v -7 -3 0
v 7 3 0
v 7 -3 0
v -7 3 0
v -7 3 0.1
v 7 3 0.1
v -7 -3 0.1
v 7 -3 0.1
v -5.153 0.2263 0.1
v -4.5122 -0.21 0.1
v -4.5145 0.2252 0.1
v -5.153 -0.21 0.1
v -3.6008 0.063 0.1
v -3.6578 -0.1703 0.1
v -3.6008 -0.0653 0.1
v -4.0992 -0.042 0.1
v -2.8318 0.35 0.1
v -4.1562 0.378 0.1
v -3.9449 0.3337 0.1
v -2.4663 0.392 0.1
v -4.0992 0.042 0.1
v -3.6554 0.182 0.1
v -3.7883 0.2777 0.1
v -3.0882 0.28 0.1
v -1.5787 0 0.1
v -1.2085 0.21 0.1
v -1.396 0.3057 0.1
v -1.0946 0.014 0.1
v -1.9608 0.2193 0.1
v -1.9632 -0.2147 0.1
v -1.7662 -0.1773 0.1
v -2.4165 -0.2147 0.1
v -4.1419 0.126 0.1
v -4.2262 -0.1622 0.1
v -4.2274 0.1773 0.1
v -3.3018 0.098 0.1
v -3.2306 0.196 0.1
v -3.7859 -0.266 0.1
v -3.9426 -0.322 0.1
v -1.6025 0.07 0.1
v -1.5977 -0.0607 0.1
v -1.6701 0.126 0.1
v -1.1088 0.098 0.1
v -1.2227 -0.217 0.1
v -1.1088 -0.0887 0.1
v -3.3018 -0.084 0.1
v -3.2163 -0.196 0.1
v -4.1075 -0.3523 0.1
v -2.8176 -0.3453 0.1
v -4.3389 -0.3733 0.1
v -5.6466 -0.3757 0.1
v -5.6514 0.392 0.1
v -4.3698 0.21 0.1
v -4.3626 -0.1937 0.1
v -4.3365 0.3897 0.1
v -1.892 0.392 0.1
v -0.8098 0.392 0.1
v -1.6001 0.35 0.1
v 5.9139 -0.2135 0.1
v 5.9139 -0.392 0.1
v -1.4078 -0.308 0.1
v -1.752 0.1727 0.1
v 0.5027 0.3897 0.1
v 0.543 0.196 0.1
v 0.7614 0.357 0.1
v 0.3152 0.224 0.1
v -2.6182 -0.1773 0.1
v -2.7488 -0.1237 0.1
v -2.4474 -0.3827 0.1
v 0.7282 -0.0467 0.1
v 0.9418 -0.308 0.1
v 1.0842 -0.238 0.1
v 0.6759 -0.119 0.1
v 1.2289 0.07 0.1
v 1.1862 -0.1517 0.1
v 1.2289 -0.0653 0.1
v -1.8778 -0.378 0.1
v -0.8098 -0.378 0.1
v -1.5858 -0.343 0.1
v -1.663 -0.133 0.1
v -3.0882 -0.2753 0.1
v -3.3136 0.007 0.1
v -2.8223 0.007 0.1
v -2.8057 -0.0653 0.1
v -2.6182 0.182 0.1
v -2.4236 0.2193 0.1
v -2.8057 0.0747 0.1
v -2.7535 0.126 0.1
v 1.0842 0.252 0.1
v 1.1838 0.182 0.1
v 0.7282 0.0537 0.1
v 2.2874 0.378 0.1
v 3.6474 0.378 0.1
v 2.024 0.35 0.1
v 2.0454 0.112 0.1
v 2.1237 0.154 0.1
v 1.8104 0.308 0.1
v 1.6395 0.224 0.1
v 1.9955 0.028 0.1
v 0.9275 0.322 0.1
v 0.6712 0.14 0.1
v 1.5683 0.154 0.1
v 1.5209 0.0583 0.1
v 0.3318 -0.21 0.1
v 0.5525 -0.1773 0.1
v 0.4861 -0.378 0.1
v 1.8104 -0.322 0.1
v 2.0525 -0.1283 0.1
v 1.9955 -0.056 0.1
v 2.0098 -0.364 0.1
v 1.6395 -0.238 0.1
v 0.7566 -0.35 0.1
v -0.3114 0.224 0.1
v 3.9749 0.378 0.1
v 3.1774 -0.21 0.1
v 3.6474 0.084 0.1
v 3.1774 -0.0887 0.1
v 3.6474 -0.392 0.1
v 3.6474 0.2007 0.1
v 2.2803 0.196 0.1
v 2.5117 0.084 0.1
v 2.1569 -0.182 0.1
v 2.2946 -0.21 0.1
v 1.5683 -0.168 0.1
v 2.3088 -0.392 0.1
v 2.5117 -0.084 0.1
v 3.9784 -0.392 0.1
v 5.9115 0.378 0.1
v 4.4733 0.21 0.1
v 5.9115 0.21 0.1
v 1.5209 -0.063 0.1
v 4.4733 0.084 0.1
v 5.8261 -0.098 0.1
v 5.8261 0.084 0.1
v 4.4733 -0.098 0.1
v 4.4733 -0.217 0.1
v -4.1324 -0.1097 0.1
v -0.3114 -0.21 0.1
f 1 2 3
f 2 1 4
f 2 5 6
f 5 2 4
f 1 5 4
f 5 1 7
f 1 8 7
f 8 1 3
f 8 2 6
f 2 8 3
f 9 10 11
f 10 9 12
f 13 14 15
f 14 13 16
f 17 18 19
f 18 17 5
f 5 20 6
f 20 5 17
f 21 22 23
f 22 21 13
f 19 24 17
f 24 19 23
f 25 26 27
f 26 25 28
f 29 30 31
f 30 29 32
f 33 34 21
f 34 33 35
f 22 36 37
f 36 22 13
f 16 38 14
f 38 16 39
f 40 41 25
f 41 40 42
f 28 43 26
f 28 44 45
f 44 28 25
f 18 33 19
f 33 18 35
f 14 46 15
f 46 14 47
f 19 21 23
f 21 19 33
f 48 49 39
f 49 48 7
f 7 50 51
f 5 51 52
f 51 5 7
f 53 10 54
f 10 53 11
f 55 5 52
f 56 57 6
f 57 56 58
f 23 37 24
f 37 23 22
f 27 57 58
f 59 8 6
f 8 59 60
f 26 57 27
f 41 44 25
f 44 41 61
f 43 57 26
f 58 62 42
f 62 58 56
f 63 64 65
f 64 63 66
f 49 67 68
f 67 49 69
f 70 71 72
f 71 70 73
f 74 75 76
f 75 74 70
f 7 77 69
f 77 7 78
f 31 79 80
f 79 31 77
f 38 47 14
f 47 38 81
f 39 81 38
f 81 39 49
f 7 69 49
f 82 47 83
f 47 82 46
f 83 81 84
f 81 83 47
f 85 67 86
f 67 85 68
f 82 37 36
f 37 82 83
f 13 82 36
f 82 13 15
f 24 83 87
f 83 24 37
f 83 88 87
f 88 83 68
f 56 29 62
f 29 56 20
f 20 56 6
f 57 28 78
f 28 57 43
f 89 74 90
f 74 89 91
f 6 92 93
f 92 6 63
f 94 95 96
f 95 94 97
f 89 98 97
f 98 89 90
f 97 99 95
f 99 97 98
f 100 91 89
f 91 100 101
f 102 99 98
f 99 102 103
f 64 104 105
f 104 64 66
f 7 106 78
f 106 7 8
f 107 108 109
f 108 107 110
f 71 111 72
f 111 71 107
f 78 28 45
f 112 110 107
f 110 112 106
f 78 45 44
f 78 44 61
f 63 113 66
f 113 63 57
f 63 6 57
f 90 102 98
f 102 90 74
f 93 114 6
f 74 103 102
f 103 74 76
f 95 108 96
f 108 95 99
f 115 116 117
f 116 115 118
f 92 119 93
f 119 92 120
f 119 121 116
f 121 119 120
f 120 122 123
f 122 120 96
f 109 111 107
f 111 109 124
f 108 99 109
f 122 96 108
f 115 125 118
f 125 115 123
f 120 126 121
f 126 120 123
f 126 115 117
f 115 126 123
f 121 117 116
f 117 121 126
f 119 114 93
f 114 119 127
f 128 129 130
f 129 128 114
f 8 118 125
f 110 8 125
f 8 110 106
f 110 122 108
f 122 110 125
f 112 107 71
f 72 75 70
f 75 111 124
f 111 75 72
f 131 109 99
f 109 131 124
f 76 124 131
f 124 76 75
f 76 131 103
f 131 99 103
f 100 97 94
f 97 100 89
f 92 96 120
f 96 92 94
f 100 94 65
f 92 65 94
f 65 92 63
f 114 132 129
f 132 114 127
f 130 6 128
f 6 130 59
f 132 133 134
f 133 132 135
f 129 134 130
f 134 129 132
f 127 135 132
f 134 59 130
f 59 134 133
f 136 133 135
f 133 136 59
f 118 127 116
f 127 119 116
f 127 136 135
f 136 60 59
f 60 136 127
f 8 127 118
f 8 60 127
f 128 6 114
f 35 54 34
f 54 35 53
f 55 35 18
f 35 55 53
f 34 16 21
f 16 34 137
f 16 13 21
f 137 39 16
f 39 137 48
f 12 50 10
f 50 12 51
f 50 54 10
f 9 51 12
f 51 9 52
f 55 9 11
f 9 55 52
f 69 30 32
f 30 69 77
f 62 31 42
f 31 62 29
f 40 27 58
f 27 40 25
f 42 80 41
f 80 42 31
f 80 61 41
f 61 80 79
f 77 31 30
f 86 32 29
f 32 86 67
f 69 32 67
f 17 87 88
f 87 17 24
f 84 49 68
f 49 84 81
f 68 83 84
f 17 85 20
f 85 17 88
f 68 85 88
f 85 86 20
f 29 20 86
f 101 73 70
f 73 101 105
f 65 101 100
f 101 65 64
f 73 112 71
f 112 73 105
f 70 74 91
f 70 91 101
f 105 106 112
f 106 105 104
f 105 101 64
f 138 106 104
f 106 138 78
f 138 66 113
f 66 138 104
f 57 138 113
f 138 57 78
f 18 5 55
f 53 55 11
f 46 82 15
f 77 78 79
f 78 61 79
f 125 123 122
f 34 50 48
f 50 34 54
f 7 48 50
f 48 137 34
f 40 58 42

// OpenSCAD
// file: ../p/box5-12.scad
use <../lib.scad>
function ldraw_lib__box5_12() = [
// 0 Box with 5 Faces without Any Edges
// 0 Name: box5-12.dat
// 0 Author: Chris Dee [cwdee]
// 0 !LDRAW_ORG Primitive UPDATE 2009-02
// 0 !LICENSE Licensed under CC BY 4.0 : see CAreadme.txt
// 
// 0 BFC CERTIFY CCW
  [0,"BFC","CERTIFY"],
  [0,"BFC","CCW"],
// 
// 0 !HISTORY 2009-09-03 [PTadmin] Official Update 2009-02
// 
// 
// 4 16 1 1 1 1 1 -1 -1 1 -1 -1 1 1
  [4,16,1,1,1,1,1,-1,-1,1,-1,-1,1,1],
// 4 16 -1 0 1 1 0 1 1 1 1 -1 1 1
  [4,16,-1,0,1,1,0,1,1,1,1,-1,1,1],
// 4 16 -1 0 -1 -1 0 1 -1 1 1 -1 1 -1
  [4,16,-1,0,-1,-1,0,1,-1,1,1,-1,1,-1],
// 4 16 1 0 -1 -1 0 -1 -1 1 -1 1 1 -1
  [4,16,1,0,-1,-1,0,-1,-1,1,-1,1,1,-1],
// 4 16 1 0 1 1 0 -1 1 1 -1 1 1 1
  [4,16,1,0,1,1,0,-1,1,1,-1,1,1,1],
// 0
];
module ldraw_lib__box5_12(step=0, col=false, unit=2/5, alt=false, line=0.2, solid=!$preview)
    makepoly(ldraw_lib__box5_12(), step=step, col=col, unit=unit, alt=alt, line=line, solid=solid);
ldraw_lib__box5_12(line=0.2);
// main file
use <../lib.scad>
use <../p/box5-12.scad>
function ldraw_lib__6255869n() = [
// 0 Sticker  0.8 x  1.8 with "DODGE" Logo
// 0 Name: 6255869n.dat
// 0 Author: Magnus Forsberg [MagFors]
// 0 !LDRAW_ORG Part UPDATE 2024-05
// 0 !LICENSE Licensed under CC BY 4.0 : see CAreadme.txt
// 
// 0 BFC CERTIFY CCW
  [0,"BFC","CERTIFY"],
  [0,"BFC","CCW"],
// 
// 0 !KEYWORDS Bricklink 75893stk01, Brickowl 472633, Dodge, Rebrickable 49146
// 0 !KEYWORDS set 75893, Speed Champions
// 
// 0 !HISTORY 2024-06-30 [OrionP] Official Update 2024-05
// 
// 
// 1 16 0 -.25 0 17.5 0 0 0 .25 0 0 0 7.5 box5-12.dat
  [1,16,0,-.25,0,17.5,0,0,0,.25,0,0,0,7.5, ldraw_lib__box5_12()],
// 4 0 -11.28633 -.25 .56292 -12.8824 -.25 .56583 -12.8824 -.25 -.525 -11.2804 -.25 -.525
  [4,0,-11.28633,-.25,.56292,-12.8824,-.25,.56583,-12.8824,-.25,-.525,-11.2804,-.25,-.525],
// 4 80 -10.248 -.25 -.105 -9.1444 -.25 -.42583 -9.002 -.25 -.16333 -9.002 -.25 .1575
  [4,80,-10.248,-.25,-.105,-9.1444,-.25,-.42583,-9.002,-.25,-.16333,-9.002,-.25,.1575],
// 4 0 -7.0796 -.25 .875 -17.5 -.25 7.5 -10.3904 -.25 .945 -9.86233 -.25 .83417
  [4,0,-7.0796,-.25,.875,-17.5,-.25,7.5,-10.3904,-.25,.945,-9.86233,-.25,.83417],
// 4 0 -6.16587 -.25 .98 17.5 -.25 7.5 -17.5 -.25 7.5 -7.0796 -.25 .875
  [4,0,-6.16587,-.25,.98,17.5,-.25,7.5,-17.5,-.25,7.5,-7.0796,-.25,.875],
// 4 80 -10.248 -.25 .105 -9.002 -.25 .1575 -9.13847 -.25 .455 -9.47073 -.25 .69417
  [4,80,-10.248,-.25,.105,-9.002,-.25,.1575,-9.13847,-.25,.455,-9.47073,-.25,.69417],
// 4 0 -9.86233 -.25 .83417 -9.47073 -.25 .69417 -7.7204 -.25 .7 -7.0796 -.25 .875
  [4,0,-9.86233,-.25,.83417,-9.47073,-.25,.69417,-7.7204,-.25,.7,-7.0796,-.25,.875],
// 4 80 -3.0212 -.25 .525 -3.48993 -.25 .76417 -3.9468 -.25 0 -2.7364 -.25 .035
  [4,80,-3.0212,-.25,.525,-3.48993,-.25,.76417,-3.9468,-.25,0,-2.7364,-.25,.035],
// 4 0 -4.90207 -.25 .54833 -6.04127 -.25 -.53667 -4.908 -.25 -.53667 -4.41553 -.25 -.44333
  [4,0,-4.90207,-.25,.54833,-6.04127,-.25,-.53667,-4.908,-.25,-.53667,-4.41553,-.25,-.44333],
// 4 0 -10.248 -.25 .105 -10.3548 -.25 .315 -10.5684 -.25 .44333 -10.56543 -.25 -.40542
  [4,0,-10.248,-.25,.105,-10.3548,-.25,.315,-10.5684,-.25,.44333,-10.56543,-.25,-.40542],
// 4 0 -9.13847 -.25 .455 -9.002 -.25 .1575 -8.2544 -.25 .245 -8.0764 -.25 .49
  [4,0,-9.13847,-.25,.455,-9.002,-.25,.1575,-8.2544,-.25,.245,-8.0764,-.25,.49],
// 4 80 -9.4648 -.25 -.665 -9.1444 -.25 -.42583 -10.248 -.25 -.105 -9.8564 -.25 -.805
  [4,80,-9.4648,-.25,-.665,-9.1444,-.25,-.42583,-10.248,-.25,-.105,-9.8564,-.25,-.805],
// 4 0 -3.99427 -.25 -.15167 -3.9468 -.25 0 -4.00613 -.25 .175 -4.17523 -.25 .315
  [4,0,-3.99427,-.25,-.15167,-3.9468,-.25,0,-4.00613,-.25,.175,-4.17523,-.25,.315],
// 3 80 -2.7364 -.25 .035 -2.772 -.25 .245 -3.0212 -.25 .525
  [3,80,-2.7364,-.25,.035,-2.772,-.25,.245,-3.0212,-.25,.525],
// 4 80 -3.9468 -.25 0 -3.0568 -.25 -.5425 -2.772 -.25 -.22167 -2.7364 -.25 .035
  [4,80,-3.9468,-.25,0,-3.0568,-.25,-.5425,-2.772,-.25,-.22167,-2.7364,-.25,.035],
// 4 80 -10.3904 -.25 .945 -10.5684 -.25 .44333 -10.3548 -.25 .315 -9.86233 -.25 .83417
  [4,80,-10.3904,-.25,.945,-10.5684,-.25,.44333,-10.3548,-.25,.315,-9.86233,-.25,.83417],
// 4 0 -8.2544 -.25 -.21 -9.002 -.25 -.16333 -9.1444 -.25 -.42583 -8.0408 -.25 -.49
  [4,0,-8.2544,-.25,-.21,-9.002,-.25,-.16333,-9.1444,-.25,-.42583,-8.0408,-.25,-.49],
// 4 80 -10.248 -.25 .105 -9.47073 -.25 .69417 -9.86233 -.25 .83417 -10.3548 -.25 .315
  [4,80,-10.248,-.25,.105,-9.47073,-.25,.69417,-9.86233,-.25,.83417,-10.3548,-.25,.315],
// 4 0 -9.8564 -.25 -.805 -10.26877 -.25 -.88083 -17.5 -.25 -7.5 -7.044 -.25 -.86333
  [4,0,-9.8564,-.25,-.805,-10.26877,-.25,-.88083,-17.5,-.25,-7.5,-7.044,-.25,-.86333],
// 3 0 -17.5 -.25 -7.5 -10.84727 -.25 -.93333 -14.11653 -.25 -.93917
  [3,0,-17.5,-.25,-7.5,-10.84727,-.25,-.93333,-14.11653,-.25,-.93917],
// 4 0 -14.11653 -.25 -.93917 -14.1284 -.25 .98 -17.5 -.25 7.5 -17.5 -.25 -7.5
  [4,0,-14.11653,-.25,-.93917,-14.1284,-.25,.98,-17.5,-.25,7.5,-17.5,-.25,-7.5],
// 4 0 -10.9244 -.25 .525 -11.28633 -.25 .56292 -11.2804 -.25 -.525 -10.9066 -.25 -.48417
  [4,0,-10.9244,-.25,.525,-11.28633,-.25,.56292,-11.2804,-.25,-.525,-10.9066,-.25,-.48417],
// 3 0 -10.84133 -.25 .97417 -17.5 -.25 7.5 -14.1284 -.25 .98
  [3,0,-10.84133,-.25,.97417,-17.5,-.25,7.5,-14.1284,-.25,.98],
// 4 0 -2.0244 -.25 .98 17.5 -.25 7.5 -4.73 -.25 .98 -4.0002 -.25 .875
  [4,0,-2.0244,-.25,.98,17.5,-.25,7.5,-4.73,-.25,.98,-4.0002,-.25,.875],
// 4 0 -9.13847 -.25 .455 -8.0764 -.25 .49 -7.7204 -.25 .7 -9.47073 -.25 .69417
  [4,0,-9.13847,-.25,.455,-8.0764,-.25,.49,-7.7204,-.25,.7,-9.47073,-.25,.69417],
// 3 0 -3.48993 -.25 .76417 -2.0244 -.25 .98 -4.0002 -.25 .875
  [3,0,-3.48993,-.25,.76417,-2.0244,-.25,.98,-4.0002,-.25,.875],
// 4 0 14.78473 -.25 -.98 17.5 -.25 -7.5 17.5 -.25 7.5 14.78473 -.25 -.53375
  [4,0,14.78473,-.25,-.98,17.5,-.25,-7.5,17.5,-.25,7.5,14.78473,-.25,-.53375],
// 3 0 -3.0212 -.25 .525 -2.0244 -.25 .98 -3.48993 -.25 .76417
  [3,0,-3.0212,-.25,.525,-2.0244,-.25,.98,-3.48993,-.25,.76417],
// 4 80 -3.99427 -.25 -.15167 -3.5196 -.25 -.77 -3.0568 -.25 -.5425 -3.9468 -.25 0
  [4,80,-3.99427,-.25,-.15167,-3.5196,-.25,-.77,-3.0568,-.25,-.5425,-3.9468,-.25,0],
// 3 0 -2.772 -.25 .245 -2.0244 -.25 .98 -3.0212 -.25 .525
  [3,0,-2.772,-.25,.245,-2.0244,-.25,.98,-3.0212,-.25,.525],
// 4 80 -4.37993 -.25 .43167 -4.17523 -.25 .315 -4.0002 -.25 .875 -4.73 -.25 .98
  [4,80,-4.37993,-.25,.43167,-4.17523,-.25,.315,-4.0002,-.25,.875,-4.73,-.25,.98],
// 4 80 1.25673 -.25 .97417 .788 -.25 .56 1.3576 -.25 .49 1.90347 -.25 .8925
  [4,80,1.25673,-.25,.97417,.788,-.25,.56,1.3576,-.25,.49,1.90347,-.25,.8925],
// 4 80 -6.5456 -.25 -.44333 -6.87193 -.25 -.30917 -7.044 -.25 -.86333 -6.1184 -.25 -.95667
  [4,80,-6.5456,-.25,-.44333,-6.87193,-.25,-.30917,-7.044,-.25,-.86333,-6.1184,-.25,-.95667],
// 4 80 2.3544 -.25 -.77 2.7104 -.25 -.595 1.8204 -.25 -.11667 1.68987 -.25 -.2975
  [4,80,2.3544,-.25,-.77,2.7104,-.25,-.595,1.8204,-.25,-.11667,1.68987,-.25,-.2975],
// 4 80 1.8204 -.25 -.11667 2.96553 -.25 -.37917 3.07233 -.25 -.16333 3.07233 -.25 .175
  [4,80,1.8204,-.25,-.11667,2.96553,-.25,-.37917,3.07233,-.25,-.16333,3.07233,-.25,.175],
// 4 0 -17.5 -.25 -7.5 -2.0244 -.25 -.945 -4.6944 -.25 -.945 -6.1184 -.25 -.95667
  [4,0,-17.5,-.25,-7.5,-2.0244,-.25,-.945,-4.6944,-.25,-.945,-6.1184,-.25,-.95667],
// 4 80 -4.41553 -.25 -.44333 -4.6944 -.25 -.945 -3.9646 -.25 -.8575 -4.15743 -.25 -.3325
  [4,80,-4.41553,-.25,-.44333,-4.6944,-.25,-.945,-3.9646,-.25,-.8575,-4.15743,-.25,-.3325],
// 4 0 -8.0408 -.25 -.49 -9.1444 -.25 -.42583 -9.4648 -.25 -.665 -7.7204 -.25 -.68833
  [4,0,-8.0408,-.25,-.49,-9.1444,-.25,-.42583,-9.4648,-.25,-.665,-7.7204,-.25,-.68833],
// 4 0 -7.7204 -.25 -.68833 -9.4648 -.25 -.665 -9.8564 -.25 -.805 -7.044 -.25 -.86333
  [4,0,-7.7204,-.25,-.68833,-9.4648,-.25,-.665,-9.8564,-.25,-.805,-7.044,-.25,-.86333],
// 3 0 -17.5 -.25 -7.5 -6.1184 -.25 -.95667 -7.044 -.25 -.86333
  [3,0,-17.5,-.25,-7.5,-6.1184,-.25,-.95667,-7.044,-.25,-.86333],
// 4 80 -8.28407 -.25 .0175 -8.2544 -.25 -.21 -8.0408 -.25 -.49 -7.05587 -.25 .0175
  [4,80,-8.28407,-.25,.0175,-8.2544,-.25,-.21,-8.0408,-.25,-.49,-7.05587,-.25,.0175],
// 4 80 -7.05587 -.25 .0175 -8.0408 -.25 -.49 -7.7204 -.25 -.68833 -7.01433 -.25 -.16333
  [4,80,-7.05587,-.25,.0175,-8.0408,-.25,-.49,-7.7204,-.25,-.68833,-7.01433,-.25,-.16333],
// 4 0 -6.5456 -.25 .455 -6.87193 -.25 -.30917 -6.5456 -.25 -.44333 -6.05907 -.25 .54833
  [4,0,-6.5456,-.25,.455,-6.87193,-.25,-.30917,-6.5456,-.25,-.44333,-6.05907,-.25,.54833],
// 4 80 -8.28407 -.25 .0175 -7.05587 -.25 .0175 -8.0764 -.25 .49 -8.2544 -.25 .245
  [4,80,-8.28407,-.25,.0175,-7.05587,-.25,.0175,-8.0764,-.25,.49,-8.2544,-.25,.245],
// 4 0 -9.002 -.25 .1575 -9.002 -.25 -.16333 -8.28407 -.25 .0175 -8.2544 -.25 .245
  [4,0,-9.002,-.25,.1575,-9.002,-.25,-.16333,-8.28407,-.25,.0175,-8.2544,-.25,.245],
// 4 80 -7.7204 -.25 .7 -8.0764 -.25 .49 -7.05587 -.25 .0175 -7.01433 -.25 .18667
  [4,80,-7.7204,-.25,.7,-8.0764,-.25,.49,-7.05587,-.25,.0175,-7.01433,-.25,.18667],
// 4 0 -7.05587 -.25 .0175 -6.87193 -.25 -.30917 -6.8838 -.25 .315 -7.01433 -.25 .18667
  [4,0,-7.05587,-.25,.0175,-6.87193,-.25,-.30917,-6.8838,-.25,.315,-7.01433,-.25,.18667],
// 4 80 -4.73 -.25 .98 -6.16587 -.25 .98 -4.90207 -.25 .54833 -4.37993 -.25 .43167
  [4,80,-4.73,-.25,.98,-6.16587,-.25,.98,-4.90207,-.25,.54833,-4.37993,-.25,.43167],
// 3 0 -6.16587 -.25 .98 -4.73 -.25 .98 17.5 -.25 7.5
  [3,0,-6.16587,-.25,.98,-4.73,-.25,.98,17.5,-.25,7.5],
// 4 0 -2.0244 -.25 -.945 -2.0244 -.25 .98 -2.772 -.25 .245 -2.7364 -.25 .035
  [4,0,-2.0244,-.25,-.945,-2.0244,-.25,.98,-2.772,-.25,.245,-2.7364,-.25,.035],
// 4 80 3.07233 -.25 .175 2.9596 -.25 .455 2.7104 -.25 .63 1.8204 -.25 .13417
  [4,80,3.07233,-.25,.175,2.9596,-.25,.455,2.7104,-.25,.63,1.8204,-.25,.13417],
// 4 0 17.5 -.25 7.5 1.25673 -.25 .97417 5.7186 -.25 .945 9.1184 -.25 .945
  [4,0,17.5,-.25,7.5,1.25673,-.25,.97417,5.7186,-.25,.945,9.1184,-.25,.945],
// 4 80 5.1134 -.25 .28 5.3092 -.25 .385 5.06 -.25 .875 4.526 -.25 .77
  [4,80,5.1134,-.25,.28,5.3092,-.25,.385,5.06,-.25,.875,4.526,-.25,.77],
// 4 0 4.0988 -.25 .56 4.526 -.25 .77 2.7104 -.25 .63 2.9596 -.25 .455
  [4,0,4.0988,-.25,.56,4.526,-.25,.77,2.7104,-.25,.63,2.9596,-.25,.455],
// 4 80 4.9888 -.25 .07 5.1134 -.25 .28 4.526 -.25 .77 4.0988 -.25 .56
  [4,80,4.9888,-.25,.07,5.1134,-.25,.28,4.526,-.25,.77,4.0988,-.25,.56],
// 4 80 1.8204 -.25 .13417 2.7104 -.25 .63 2.3188 -.25 .805 1.678 -.25 .35
  [4,80,1.8204,-.25,.13417,2.7104,-.25,.63,2.3188,-.25,.805,1.678,-.25,.35],
// 4 80 4.9888 -.25 .07 4.0988 -.25 .56 3.9208 -.25 .385 3.80213 -.25 .14583
  [4,80,4.9888,-.25,.07,4.0988,-.25,.56,3.9208,-.25,.385,3.80213,-.25,.14583],
// 4 0 1.38133 -.25 -.44333 1.3576 -.25 .49 .788 -.25 .56 .82953 -.25 -.525
  [4,0,1.38133,-.25,-.44333,1.3576,-.25,.49,.788,-.25,.56,.82953,-.25,-.525],
// 4 0 -17.5 -.25 -7.5 17.5 -.25 -7.5 1.2152 -.25 -.945 -2.0244 -.25 -.945
  [4,0,-17.5,-.25,-7.5,17.5,-.25,-7.5,1.2152,-.25,-.945,-2.0244,-.25,-.945],
// 4 80 4.526 -.25 -.805 5.0244 -.25 -.91 5.1312 -.25 -.32083 4.9888 -.25 -.14
  [4,80,4.526,-.25,-.805,5.0244,-.25,-.91,5.1312,-.25,-.32083,4.9888,-.25,-.14],
// 4 0 4.0988 -.25 -.595 2.7104 -.25 -.595 2.3544 -.25 -.77 4.526 -.25 -.805
  [4,0,4.0988,-.25,-.595,2.7104,-.25,-.595,2.3544,-.25,-.77,4.526,-.25,-.805],
// 3 0 -2.0244 -.25 -.945 -2.7364 -.25 .035 -2.772 -.25 -.22167
  [3,0,-2.0244,-.25,-.945,-2.7364,-.25,.035,-2.772,-.25,-.22167],
// 4 0 1.8916 -.25 -.875 1.2152 -.25 -.945 5.0244 -.25 -.91 4.526 -.25 -.805
  [4,0,1.8916,-.25,-.875,1.2152,-.25,-.945,5.0244,-.25,-.91,4.526,-.25,-.805],
// 3 0 -2.0244 -.25 -.945 -2.772 -.25 -.22167 -3.0568 -.25 -.5425
  [3,0,-2.0244,-.25,-.945,-2.772,-.25,-.22167,-3.0568,-.25,-.5425],
// 3 0 -2.0244 -.25 -.945 -3.0568 -.25 -.5425 -3.5196 -.25 -.77
  [3,0,-2.0244,-.25,-.945,-3.0568,-.25,-.5425,-3.5196,-.25,-.77],
// 4 80 -.7784 -.25 .56 .788 -.25 .56 1.25673 -.25 .97417 -2.0244 -.25 .98
  [4,80,-.7784,-.25,.56,.788,-.25,.56,1.25673,-.25,.97417,-2.0244,-.25,.98],
// 3 0 1.25673 -.25 .97417 17.5 -.25 7.5 -2.0244 -.25 .98
  [3,0,1.25673,-.25,.97417,17.5,-.25,7.5,-2.0244,-.25,.98],
// 4 0 3.9208 -.25 .385 4.0988 -.25 .56 2.9596 -.25 .455 3.07233 -.25 .175
  [4,0,3.9208,-.25,.385,4.0988,-.25,.56,2.9596,-.25,.455,3.07233,-.25,.175],
// 3 0 9.1184 -.25 .945 9.9372 -.25 .945 17.5 -.25 7.5
  [3,0,9.1184,-.25,.945,9.9372,-.25,.945,17.5,-.25,7.5],
// 4 0 3.80213 -.25 .14583 3.9208 -.25 .385 3.07233 -.25 .175 3.07233 -.25 -.16333
  [4,0,3.80213,-.25,.14583,3.9208,-.25,.385,3.07233,-.25,.175,3.07233,-.25,-.16333],
// 4 0 5.1134 -.25 .28 4.9888 -.25 .07 5.1312 -.25 -.32083 5.3092 -.25 .385
  [4,0,5.1134,-.25,.28,4.9888,-.25,.07,5.1312,-.25,-.32083,5.3092,-.25,.385],
// 4 80 9.1184 -.25 .21 7.9436 -.25 -.22167 7.9436 -.25 -.525 9.1184 -.25 -.98
  [4,80,9.1184,-.25,.21,7.9436,-.25,-.22167,7.9436,-.25,-.525,9.1184,-.25,-.98],
// 4 80 5.7186 -.25 .945 5.7008 -.25 .49 9.1184 -.25 .50167 9.1184 -.25 .945
  [4,80,5.7186,-.25,.945,5.7008,-.25,.49,9.1184,-.25,.50167,9.1184,-.25,.945],
// 4 0 6.2793 -.25 .21 9.1184 -.25 .21 9.1184 -.25 .50167 5.7008 -.25 .49
  [4,0,6.2793,-.25,.21,9.1184,-.25,.21,9.1184,-.25,.50167,5.7008,-.25,.49],
// 4 0 5.39227 -.25 -.455 5.7364 -.25 -.525 5.7008 -.25 .49 5.3092 -.25 .385
  [4,0,5.39227,-.25,-.455,5.7364,-.25,-.525,5.7008,-.25,.49,5.3092,-.25,.385],
// 4 80 4.9888 -.25 -.14 3.9208 -.25 -.42 4.0988 -.25 -.595 4.526 -.25 -.805
  [4,80,4.9888,-.25,-.14,3.9208,-.25,-.42,4.0988,-.25,-.595,4.526,-.25,-.805],
// 3 0 5.1312 -.25 -.32083 4.9888 -.25 .07 4.9888 -.25 -.14
  [3,0,5.1312,-.25,-.32083,4.9888,-.25,.07,4.9888,-.25,-.14],
// 3 0 5.39227 -.25 -.455 5.3092 -.25 .385 5.1312 -.25 -.32083
  [3,0,5.39227,-.25,-.455,5.3092,-.25,.385,5.1312,-.25,-.32083],
// 4 80 5.7364 -.25 -.525 5.772 -.25 -.98 9.1184 -.25 -.98 7.9436 -.25 -.525
  [4,80,5.7364,-.25,-.525,5.772,-.25,-.98,9.1184,-.25,-.98,7.9436,-.25,-.525],
// 4 0 5.7008 -.25 .49 5.7364 -.25 -.525 6.2793 -.25 -.21 6.2793 -.25 .21
  [4,0,5.7008,-.25,.49,5.7364,-.25,-.525,6.2793,-.25,-.21,6.2793,-.25,.21],
// 4 0 6.2793 -.25 -.21 5.7364 -.25 -.525 7.9436 -.25 -.525 7.9436 -.25 -.22167
  [4,0,6.2793,-.25,-.21,5.7364,-.25,-.525,7.9436,-.25,-.525,7.9436,-.25,-.22167],
// 4 80 7.9436 -.25 -.22167 9.1184 -.25 .21 6.2793 -.25 .21 6.2793 -.25 -.21
  [4,80,7.9436,-.25,-.22167,9.1184,-.25,.21,6.2793,-.25,.21,6.2793,-.25,-.21],
// 4 0 9.9461 -.25 -.98 9.9372 -.25 .945 9.1184 -.25 .945 9.1184 -.25 .50167
  [4,0,9.9461,-.25,-.98,9.9372,-.25,.945,9.1184,-.25,.945,9.1184,-.25,.50167],
// 4 80 14.7788 -.25 .945 9.9372 -.25 .945 11.1832 -.25 .525 14.7788 -.25 .525
  [4,80,14.7788,-.25,.945,9.9372,-.25,.945,11.1832,-.25,.525,14.7788,-.25,.525],
// 3 0 17.5 -.25 -7.5 9.1184 -.25 -.98 5.772 -.25 -.98
  [3,0,17.5,-.25,-7.5,9.1184,-.25,-.98,5.772,-.25,-.98],
// 4 0 17.5 -.25 -7.5 5.772 -.25 -.98 5.0244 -.25 -.91 1.2152 -.25 -.945
  [4,0,17.5,-.25,-7.5,5.772,-.25,-.98,5.0244,-.25,-.91,1.2152,-.25,-.945],
// 4 80 5.0244 -.25 -.91 5.772 -.25 -.98 5.39227 -.25 -.455 5.1312 -.25 -.32083
  [4,80,5.0244,-.25,-.91,5.772,-.25,-.98,5.39227,-.25,-.455,5.1312,-.25,-.32083],
// 3 0 1.8916 -.25 -.875 4.526 -.25 -.805 2.3544 -.25 -.77
  [3,0,1.8916,-.25,-.875,4.526,-.25,-.805,2.3544,-.25,-.77],
// 3 80 2.7104 -.25 -.595 2.96553 -.25 -.37917 1.8204 -.25 -.11667
  [3,80,2.7104,-.25,-.595,2.96553,-.25,-.37917,1.8204,-.25,-.11667],
// 4 0 2.96553 -.25 -.37917 2.7104 -.25 -.595 4.0988 -.25 -.595 3.9208 -.25 -.42
  [4,0,2.96553,-.25,-.37917,2.7104,-.25,-.595,4.0988,-.25,-.595,3.9208,-.25,-.42],
// 4 80 3.80213 -.25 -.1575 3.9208 -.25 -.42 4.9888 -.25 -.14 4.9888 -.25 .07
  [4,80,3.80213,-.25,-.1575,3.9208,-.25,-.42,4.9888,-.25,-.14,4.9888,-.25,.07],
// 4 0 2.96553 -.25 -.37917 3.9208 -.25 -.42 3.80213 -.25 -.1575 3.07233 -.25 -.16333
  [4,0,2.96553,-.25,-.37917,3.9208,-.25,-.42,3.80213,-.25,-.1575,3.07233,-.25,-.16333],
// 3 0 3.07233 -.25 -.16333 3.80213 -.25 -.1575 3.80213 -.25 .14583
  [3,0,3.07233,-.25,-.16333,3.80213,-.25,-.1575,3.80213,-.25,.14583],
// 3 80 3.80213 -.25 -.1575 4.9888 -.25 .07 3.80213 -.25 .14583
  [3,80,3.80213,-.25,-.1575,4.9888,-.25,.07,3.80213,-.25,.14583],
// 4 0 2.3188 -.25 .805 2.7104 -.25 .63 4.526 -.25 .77 5.06 -.25 .875
  [4,0,2.3188,-.25,.805,2.7104,-.25,.63,4.526,-.25,.77,5.06,-.25,.875],
// 4 80 5.7186 -.25 .945 5.06 -.25 .875 5.3092 -.25 .385 5.7008 -.25 .49
  [4,80,5.7186,-.25,.945,5.06,-.25,.875,5.3092,-.25,.385,5.7008,-.25,.49],
// 3 0 2.3188 -.25 .805 5.06 -.25 .875 1.90347 -.25 .8925
  [3,0,2.3188,-.25,.805,5.06,-.25,.875,1.90347,-.25,.8925],
// 4 0 5.06 -.25 .875 5.7186 -.25 .945 1.25673 -.25 .97417 1.90347 -.25 .8925
  [4,0,5.06,-.25,.875,5.7186,-.25,.945,1.25673,-.25,.97417,1.90347,-.25,.8925],
// 4 80 9.9461 -.25 -.98 11.1832 -.25 .21 11.1832 -.25 .525 9.9372 -.25 .945
  [4,80,9.9461,-.25,-.98,11.1832,-.25,.21,11.1832,-.25,.525,9.9372,-.25,.945],
// 4 0 17.5 -.25 7.5 14.7788 -.25 .945 14.7788 -.25 .525 14.78473 -.25 -.53375
  [4,0,17.5,-.25,7.5,14.7788,-.25,.945,14.7788,-.25,.525,14.78473,-.25,-.53375],
// 4 80 14.5652 -.25 -.245 14.5652 -.25 .21 11.1832 -.25 .21 11.1832 -.25 -.245
  [4,80,14.5652,-.25,-.245,14.5652,-.25,.21,11.1832,-.25,.21,11.1832,-.25,-.245],
// 4 0 14.5652 -.25 .21 14.7788 -.25 .525 11.1832 -.25 .525 11.1832 -.25 .21
  [4,0,14.5652,-.25,.21,14.7788,-.25,.525,11.1832,-.25,.525,11.1832,-.25,.21],
// 3 80 9.9461 -.25 -.98 11.1832 -.25 -.245 11.1832 -.25 .21
  [3,80,9.9461,-.25,-.98,11.1832,-.25,-.245,11.1832,-.25,.21],
// 4 0 14.78473 -.25 -.53375 14.7788 -.25 .525 14.5652 -.25 .21 14.5652 -.25 -.245
  [4,0,14.78473,-.25,-.53375,14.7788,-.25,.525,14.5652,-.25,.21,14.5652,-.25,-.245],
// 4 0 11.1832 -.25 -.5425 14.78473 -.25 -.53375 14.5652 -.25 -.245 11.1832 -.25 -.245
  [4,0,11.1832,-.25,-.5425,14.78473,-.25,-.53375,14.5652,-.25,-.245,11.1832,-.25,-.245],
// 3 0 9.1184 -.25 -.98 9.9461 -.25 -.98 9.1184 -.25 .21
  [3,0,9.1184,-.25,-.98,9.9461,-.25,-.98,9.1184,-.25,.21],
// 3 0 9.9461 -.25 -.98 9.1184 -.25 .50167 9.1184 -.25 .21
  [3,0,9.9461,-.25,-.98,9.1184,-.25,.50167,9.1184,-.25,.21],
// 3 80 9.9461 -.25 -.98 11.1832 -.25 -.5425 11.1832 -.25 -.245
  [3,80,9.9461,-.25,-.98,11.1832,-.25,-.5425,11.1832,-.25,-.245],
// 4 80 14.78473 -.25 -.98 14.78473 -.25 -.53375 11.1832 -.25 -.5425 9.9461 -.25 -.98
  [4,80,14.78473,-.25,-.98,14.78473,-.25,-.53375,11.1832,-.25,-.5425,9.9461,-.25,-.98],
// 3 0 17.5 -.25 -7.5 9.9461 -.25 -.98 9.1184 -.25 -.98
  [3,0,17.5,-.25,-7.5,9.9461,-.25,-.98,9.1184,-.25,-.98],
// 3 0 17.5 -.25 -7.5 14.78473 -.25 -.98 9.9461 -.25 -.98
  [3,0,17.5,-.25,-7.5,14.78473,-.25,-.98,9.9461,-.25,-.98],
// 3 0 14.7788 -.25 .945 17.5 -.25 7.5 9.9372 -.25 .945
  [3,0,14.7788,-.25,.945,17.5,-.25,7.5,9.9372,-.25,.945],
// 4 0 -10.5684 -.25 .44333 -10.9244 -.25 .525 -10.9066 -.25 -.48417 -10.56543 -.25 -.40542
  [4,0,-10.5684,-.25,.44333,-10.9244,-.25,.525,-10.9066,-.25,-.48417,-10.56543,-.25,-.40542],
// 4 80 -10.84133 -.25 .97417 -10.9244 -.25 .525 -10.5684 -.25 .44333 -10.3904 -.25 .945
  [4,80,-10.84133,-.25,.97417,-10.9244,-.25,.525,-10.5684,-.25,.44333,-10.3904,-.25,.945],
// 4 0 -10.56543 -.25 -.40542 -10.33107 -.25 -.27417 -10.248 -.25 -.105 -10.248 -.25 .105
  [4,0,-10.56543,-.25,-.40542,-10.33107,-.25,-.27417,-10.248,-.25,-.105,-10.248,-.25,.105],
// 3 80 -10.248 -.25 -.105 -9.002 -.25 .1575 -10.248 -.25 .105
  [3,80,-10.248,-.25,-.105,-9.002,-.25,.1575,-10.248,-.25,.105],
// 4 80 -9.8564 -.25 -.805 -10.248 -.25 -.105 -10.33107 -.25 -.27417 -10.26877 -.25 -.88083
  [4,80,-9.8564,-.25,-.805,-10.248,-.25,-.105,-10.33107,-.25,-.27417,-10.26877,-.25,-.88083],
// 4 80 -12.8824 -.25 -.525 -14.11653 -.25 -.93917 -10.84727 -.25 -.93333 -11.2804 -.25 -.525
  [4,80,-12.8824,-.25,-.525,-14.11653,-.25,-.93917,-10.84727,-.25,-.93333,-11.2804,-.25,-.525],
// 3 80 -10.84727 -.25 -.93333 -10.9066 -.25 -.48417 -11.2804 -.25 -.525
  [3,80,-10.84727,-.25,-.93333,-10.9066,-.25,-.48417,-11.2804,-.25,-.525],
// 4 80 -14.11653 -.25 -.93917 -12.8824 -.25 -.525 -12.8824 -.25 .56583 -14.1284 -.25 .98
  [4,80,-14.11653,-.25,-.93917,-12.8824,-.25,-.525,-12.8824,-.25,.56583,-14.1284,-.25,.98],
// 4 80 -10.84133 -.25 .97417 -14.1284 -.25 .98 -12.8824 -.25 .56583 -11.28633 -.25 .56292
  [4,80,-10.84133,-.25,.97417,-14.1284,-.25,.98,-12.8824,-.25,.56583,-11.28633,-.25,.56292],
// 4 80 -4.908 -.25 -.53667 -6.04127 -.25 -.53667 -6.1184 -.25 -.95667 -4.6944 -.25 -.945
  [4,80,-4.908,-.25,-.53667,-6.04127,-.25,-.53667,-6.1184,-.25,-.95667,-4.6944,-.25,-.945],
// 4 0 -4.37993 -.25 .43167 -4.90207 -.25 .54833 -4.41553 -.25 -.44333 -4.17523 -.25 .315
  [4,0,-4.37993,-.25,.43167,-4.90207,-.25,.54833,-4.41553,-.25,-.44333,-4.17523,-.25,.315],
// 4 80 -4.00613 -.25 .175 -3.9468 -.25 0 -3.48993 -.25 .76417 -4.0002 -.25 .875
  [4,80,-4.00613,-.25,.175,-3.9468,-.25,0,-3.48993,-.25,.76417,-4.0002,-.25,.875],
// 4 0 -4.15743 -.25 -.3325 -3.99427 -.25 -.15167 -4.17523 -.25 .315 -4.41553 -.25 -.44333
  [4,0,-4.15743,-.25,-.3325,-3.99427,-.25,-.15167,-4.17523,-.25,.315,-4.41553,-.25,-.44333],
// 4 80 -4.15743 -.25 -.3325 -3.9646 -.25 -.8575 -3.5196 -.25 -.77 -3.99427 -.25 -.15167
  [4,80,-4.15743,-.25,-.3325,-3.9646,-.25,-.8575,-3.5196,-.25,-.77,-3.99427,-.25,-.15167],
// 3 80 -4.6944 -.25 -.945 -4.41553 -.25 -.44333 -4.908 -.25 -.53667
  [3,80,-4.6944,-.25,-.945,-4.41553,-.25,-.44333,-4.908,-.25,-.53667],
// 4 0 -6.05907 -.25 .54833 -6.5456 -.25 -.44333 -6.04127 -.25 -.53667 -4.90207 -.25 .54833
  [4,0,-6.05907,-.25,.54833,-6.5456,-.25,-.44333,-6.04127,-.25,-.53667,-4.90207,-.25,.54833],
// 3 80 -6.1184 -.25 -.95667 -6.04127 -.25 -.53667 -6.5456 -.25 -.44333
  [3,80,-6.1184,-.25,-.95667,-6.04127,-.25,-.53667,-6.5456,-.25,-.44333],
// 4 80 -7.01433 -.25 .18667 -6.8838 -.25 .315 -7.0796 -.25 .875 -7.7204 -.25 .7
  [4,80,-7.01433,-.25,.18667,-6.8838,-.25,.315,-7.0796,-.25,.875,-7.7204,-.25,.7],
// 4 80 -7.01433 -.25 -.16333 -7.7204 -.25 -.68833 -7.044 -.25 -.86333 -6.87193 -.25 -.30917
  [4,80,-7.01433,-.25,-.16333,-7.7204,-.25,-.68833,-7.044,-.25,-.86333,-6.87193,-.25,-.30917],
// 3 0 -6.87193 -.25 -.30917 -7.05587 -.25 .0175 -7.01433 -.25 -.16333
  [3,0,-6.87193,-.25,-.30917,-7.05587,-.25,.0175,-7.01433,-.25,-.16333],
// 4 80 -7.0796 -.25 .875 -6.8838 -.25 .315 -6.5456 -.25 .455 -6.16587 -.25 .98
  [4,80,-7.0796,-.25,.875,-6.8838,-.25,.315,-6.5456,-.25,.455,-6.16587,-.25,.98],
// 3 0 -6.87193 -.25 -.30917 -6.5456 -.25 .455 -6.8838 -.25 .315
  [3,0,-6.87193,-.25,-.30917,-6.5456,-.25,.455,-6.8838,-.25,.315],
// 3 80 -6.5456 -.25 .455 -6.05907 -.25 .54833 -6.16587 -.25 .98
  [3,80,-6.5456,-.25,.455,-6.05907,-.25,.54833,-6.16587,-.25,.98],
// 3 80 -4.90207 -.25 .54833 -6.16587 -.25 .98 -6.05907 -.25 .54833
  [3,80,-4.90207,-.25,.54833,-6.16587,-.25,.98,-6.05907,-.25,.54833],
// 4 0 1.678 -.25 .35 1.38133 -.25 -.44333 1.68987 -.25 -.2975 1.8204 -.25 -.11667
  [4,0,1.678,-.25,.35,1.38133,-.25,-.44333,1.68987,-.25,-.2975,1.8204,-.25,-.11667],
// 4 80 1.90347 -.25 .8925 1.3576 -.25 .49 1.678 -.25 .35 2.3188 -.25 .805
  [4,80,1.90347,-.25,.8925,1.3576,-.25,.49,1.678,-.25,.35,2.3188,-.25,.805],
// 4 80 1.8916 -.25 -.875 2.3544 -.25 -.77 1.68987 -.25 -.2975 1.38133 -.25 -.44333
  [4,80,1.8916,-.25,-.875,2.3544,-.25,-.77,1.68987,-.25,-.2975,1.38133,-.25,-.44333],
// 3 80 1.8204 -.25 -.11667 3.07233 -.25 .175 1.8204 -.25 .13417
  [3,80,1.8204,-.25,-.11667,3.07233,-.25,.175,1.8204,-.25,.13417],
// 3 0 1.8204 -.25 -.11667 1.8204 -.25 .13417 1.678 -.25 .35
  [3,0,1.8204,-.25,-.11667,1.8204,-.25,.13417,1.678,-.25,.35],
// 4 80 1.2152 -.25 -.945 1.8916 -.25 -.875 1.38133 -.25 -.44333 .82953 -.25 -.525
  [4,80,1.2152,-.25,-.945,1.8916,-.25,-.875,1.38133,-.25,-.44333,.82953,-.25,-.525],
// 3 0 1.38133 -.25 -.44333 1.678 -.25 .35 1.3576 -.25 .49
  [3,0,1.38133,-.25,-.44333,1.678,-.25,.35,1.3576,-.25,.49],
// 4 80 1.2152 -.25 -.945 .82953 -.25 -.525 -.7784 -.25 -.525 -2.0244 -.25 -.945
  [4,80,1.2152,-.25,-.945,.82953,-.25,-.525,-.7784,-.25,-.525,-2.0244,-.25,-.945],
// 4 0 -.7784 -.25 -.525 .82953 -.25 -.525 .788 -.25 .56 -.7784 -.25 .56
  [4,0,-.7784,-.25,-.525,.82953,-.25,-.525,.788,-.25,.56,-.7784,-.25,.56],
// 4 80 -.7784 -.25 .56 -2.0244 -.25 .98 -2.0244 -.25 -.945 -.7784 -.25 -.525
  [4,80,-.7784,-.25,.56,-2.0244,-.25,.98,-2.0244,-.25,-.945,-.7784,-.25,-.525],
// 3 0 -10.3904 -.25 .945 -17.5 -.25 7.5 -10.84133 -.25 .97417
  [3,0,-10.3904,-.25,.945,-17.5,-.25,7.5,-10.84133,-.25,.97417],
// 3 80 -10.9244 -.25 .525 -10.84133 -.25 .97417 -11.28633 -.25 .56292
  [3,80,-10.9244,-.25,.525,-10.84133,-.25,.97417,-11.28633,-.25,.56292],
// 3 0 -8.2544 -.25 -.21 -8.28407 -.25 .0175 -9.002 -.25 -.16333
  [3,0,-8.2544,-.25,-.21,-8.28407,-.25,.0175,-9.002,-.25,-.16333],
// 3 0 -4.6944 -.25 -.945 -2.0244 -.25 -.945 -3.9646 -.25 -.8575
  [3,0,-4.6944,-.25,-.945,-2.0244,-.25,-.945,-3.9646,-.25,-.8575],
// 3 0 -2.0244 -.25 -.945 -3.5196 -.25 -.77 -3.9646 -.25 -.8575
  [3,0,-2.0244,-.25,-.945,-3.5196,-.25,-.77,-3.9646,-.25,-.8575],
// 3 80 5.772 -.25 -.98 5.7364 -.25 -.525 5.39227 -.25 -.455
  [3,80,5.772,-.25,-.98,5.7364,-.25,-.525,5.39227,-.25,-.455],
// 4 80 -10.56543 -.25 -.40542 -10.9066 -.25 -.48417 -10.84727 -.25 -.93333 -10.26877 -.25 -.88083
  [4,80,-10.56543,-.25,-.40542,-10.9066,-.25,-.48417,-10.84727,-.25,-.93333,-10.26877,-.25,-.88083],
// 3 0 -17.5 -.25 -7.5 -10.26877 -.25 -.88083 -10.84727 -.25 -.93333
  [3,0,-17.5,-.25,-7.5,-10.26877,-.25,-.88083,-10.84727,-.25,-.93333],
// 3 80 -10.26877 -.25 -.88083 -10.33107 -.25 -.27417 -10.56543 -.25 -.40542
  [3,80,-10.26877,-.25,-.88083,-10.33107,-.25,-.27417,-10.56543,-.25,-.40542],
// 3 80 -4.00613 -.25 .175 -4.0002 -.25 .875 -4.17523 -.25 .315
  [3,80,-4.00613,-.25,.175,-4.0002,-.25,.875,-4.17523,-.25,.315],
];
module ldraw_lib__6255869n(step=0, col=false, unit=2/5, alt=false, line=0.2, solid=!$preview)
    makepoly(ldraw_lib__6255869n(), step=step, col=col, unit=unit, alt=alt, line=line, solid=solid);
ldraw_lib__6255869n(line=0.2);
